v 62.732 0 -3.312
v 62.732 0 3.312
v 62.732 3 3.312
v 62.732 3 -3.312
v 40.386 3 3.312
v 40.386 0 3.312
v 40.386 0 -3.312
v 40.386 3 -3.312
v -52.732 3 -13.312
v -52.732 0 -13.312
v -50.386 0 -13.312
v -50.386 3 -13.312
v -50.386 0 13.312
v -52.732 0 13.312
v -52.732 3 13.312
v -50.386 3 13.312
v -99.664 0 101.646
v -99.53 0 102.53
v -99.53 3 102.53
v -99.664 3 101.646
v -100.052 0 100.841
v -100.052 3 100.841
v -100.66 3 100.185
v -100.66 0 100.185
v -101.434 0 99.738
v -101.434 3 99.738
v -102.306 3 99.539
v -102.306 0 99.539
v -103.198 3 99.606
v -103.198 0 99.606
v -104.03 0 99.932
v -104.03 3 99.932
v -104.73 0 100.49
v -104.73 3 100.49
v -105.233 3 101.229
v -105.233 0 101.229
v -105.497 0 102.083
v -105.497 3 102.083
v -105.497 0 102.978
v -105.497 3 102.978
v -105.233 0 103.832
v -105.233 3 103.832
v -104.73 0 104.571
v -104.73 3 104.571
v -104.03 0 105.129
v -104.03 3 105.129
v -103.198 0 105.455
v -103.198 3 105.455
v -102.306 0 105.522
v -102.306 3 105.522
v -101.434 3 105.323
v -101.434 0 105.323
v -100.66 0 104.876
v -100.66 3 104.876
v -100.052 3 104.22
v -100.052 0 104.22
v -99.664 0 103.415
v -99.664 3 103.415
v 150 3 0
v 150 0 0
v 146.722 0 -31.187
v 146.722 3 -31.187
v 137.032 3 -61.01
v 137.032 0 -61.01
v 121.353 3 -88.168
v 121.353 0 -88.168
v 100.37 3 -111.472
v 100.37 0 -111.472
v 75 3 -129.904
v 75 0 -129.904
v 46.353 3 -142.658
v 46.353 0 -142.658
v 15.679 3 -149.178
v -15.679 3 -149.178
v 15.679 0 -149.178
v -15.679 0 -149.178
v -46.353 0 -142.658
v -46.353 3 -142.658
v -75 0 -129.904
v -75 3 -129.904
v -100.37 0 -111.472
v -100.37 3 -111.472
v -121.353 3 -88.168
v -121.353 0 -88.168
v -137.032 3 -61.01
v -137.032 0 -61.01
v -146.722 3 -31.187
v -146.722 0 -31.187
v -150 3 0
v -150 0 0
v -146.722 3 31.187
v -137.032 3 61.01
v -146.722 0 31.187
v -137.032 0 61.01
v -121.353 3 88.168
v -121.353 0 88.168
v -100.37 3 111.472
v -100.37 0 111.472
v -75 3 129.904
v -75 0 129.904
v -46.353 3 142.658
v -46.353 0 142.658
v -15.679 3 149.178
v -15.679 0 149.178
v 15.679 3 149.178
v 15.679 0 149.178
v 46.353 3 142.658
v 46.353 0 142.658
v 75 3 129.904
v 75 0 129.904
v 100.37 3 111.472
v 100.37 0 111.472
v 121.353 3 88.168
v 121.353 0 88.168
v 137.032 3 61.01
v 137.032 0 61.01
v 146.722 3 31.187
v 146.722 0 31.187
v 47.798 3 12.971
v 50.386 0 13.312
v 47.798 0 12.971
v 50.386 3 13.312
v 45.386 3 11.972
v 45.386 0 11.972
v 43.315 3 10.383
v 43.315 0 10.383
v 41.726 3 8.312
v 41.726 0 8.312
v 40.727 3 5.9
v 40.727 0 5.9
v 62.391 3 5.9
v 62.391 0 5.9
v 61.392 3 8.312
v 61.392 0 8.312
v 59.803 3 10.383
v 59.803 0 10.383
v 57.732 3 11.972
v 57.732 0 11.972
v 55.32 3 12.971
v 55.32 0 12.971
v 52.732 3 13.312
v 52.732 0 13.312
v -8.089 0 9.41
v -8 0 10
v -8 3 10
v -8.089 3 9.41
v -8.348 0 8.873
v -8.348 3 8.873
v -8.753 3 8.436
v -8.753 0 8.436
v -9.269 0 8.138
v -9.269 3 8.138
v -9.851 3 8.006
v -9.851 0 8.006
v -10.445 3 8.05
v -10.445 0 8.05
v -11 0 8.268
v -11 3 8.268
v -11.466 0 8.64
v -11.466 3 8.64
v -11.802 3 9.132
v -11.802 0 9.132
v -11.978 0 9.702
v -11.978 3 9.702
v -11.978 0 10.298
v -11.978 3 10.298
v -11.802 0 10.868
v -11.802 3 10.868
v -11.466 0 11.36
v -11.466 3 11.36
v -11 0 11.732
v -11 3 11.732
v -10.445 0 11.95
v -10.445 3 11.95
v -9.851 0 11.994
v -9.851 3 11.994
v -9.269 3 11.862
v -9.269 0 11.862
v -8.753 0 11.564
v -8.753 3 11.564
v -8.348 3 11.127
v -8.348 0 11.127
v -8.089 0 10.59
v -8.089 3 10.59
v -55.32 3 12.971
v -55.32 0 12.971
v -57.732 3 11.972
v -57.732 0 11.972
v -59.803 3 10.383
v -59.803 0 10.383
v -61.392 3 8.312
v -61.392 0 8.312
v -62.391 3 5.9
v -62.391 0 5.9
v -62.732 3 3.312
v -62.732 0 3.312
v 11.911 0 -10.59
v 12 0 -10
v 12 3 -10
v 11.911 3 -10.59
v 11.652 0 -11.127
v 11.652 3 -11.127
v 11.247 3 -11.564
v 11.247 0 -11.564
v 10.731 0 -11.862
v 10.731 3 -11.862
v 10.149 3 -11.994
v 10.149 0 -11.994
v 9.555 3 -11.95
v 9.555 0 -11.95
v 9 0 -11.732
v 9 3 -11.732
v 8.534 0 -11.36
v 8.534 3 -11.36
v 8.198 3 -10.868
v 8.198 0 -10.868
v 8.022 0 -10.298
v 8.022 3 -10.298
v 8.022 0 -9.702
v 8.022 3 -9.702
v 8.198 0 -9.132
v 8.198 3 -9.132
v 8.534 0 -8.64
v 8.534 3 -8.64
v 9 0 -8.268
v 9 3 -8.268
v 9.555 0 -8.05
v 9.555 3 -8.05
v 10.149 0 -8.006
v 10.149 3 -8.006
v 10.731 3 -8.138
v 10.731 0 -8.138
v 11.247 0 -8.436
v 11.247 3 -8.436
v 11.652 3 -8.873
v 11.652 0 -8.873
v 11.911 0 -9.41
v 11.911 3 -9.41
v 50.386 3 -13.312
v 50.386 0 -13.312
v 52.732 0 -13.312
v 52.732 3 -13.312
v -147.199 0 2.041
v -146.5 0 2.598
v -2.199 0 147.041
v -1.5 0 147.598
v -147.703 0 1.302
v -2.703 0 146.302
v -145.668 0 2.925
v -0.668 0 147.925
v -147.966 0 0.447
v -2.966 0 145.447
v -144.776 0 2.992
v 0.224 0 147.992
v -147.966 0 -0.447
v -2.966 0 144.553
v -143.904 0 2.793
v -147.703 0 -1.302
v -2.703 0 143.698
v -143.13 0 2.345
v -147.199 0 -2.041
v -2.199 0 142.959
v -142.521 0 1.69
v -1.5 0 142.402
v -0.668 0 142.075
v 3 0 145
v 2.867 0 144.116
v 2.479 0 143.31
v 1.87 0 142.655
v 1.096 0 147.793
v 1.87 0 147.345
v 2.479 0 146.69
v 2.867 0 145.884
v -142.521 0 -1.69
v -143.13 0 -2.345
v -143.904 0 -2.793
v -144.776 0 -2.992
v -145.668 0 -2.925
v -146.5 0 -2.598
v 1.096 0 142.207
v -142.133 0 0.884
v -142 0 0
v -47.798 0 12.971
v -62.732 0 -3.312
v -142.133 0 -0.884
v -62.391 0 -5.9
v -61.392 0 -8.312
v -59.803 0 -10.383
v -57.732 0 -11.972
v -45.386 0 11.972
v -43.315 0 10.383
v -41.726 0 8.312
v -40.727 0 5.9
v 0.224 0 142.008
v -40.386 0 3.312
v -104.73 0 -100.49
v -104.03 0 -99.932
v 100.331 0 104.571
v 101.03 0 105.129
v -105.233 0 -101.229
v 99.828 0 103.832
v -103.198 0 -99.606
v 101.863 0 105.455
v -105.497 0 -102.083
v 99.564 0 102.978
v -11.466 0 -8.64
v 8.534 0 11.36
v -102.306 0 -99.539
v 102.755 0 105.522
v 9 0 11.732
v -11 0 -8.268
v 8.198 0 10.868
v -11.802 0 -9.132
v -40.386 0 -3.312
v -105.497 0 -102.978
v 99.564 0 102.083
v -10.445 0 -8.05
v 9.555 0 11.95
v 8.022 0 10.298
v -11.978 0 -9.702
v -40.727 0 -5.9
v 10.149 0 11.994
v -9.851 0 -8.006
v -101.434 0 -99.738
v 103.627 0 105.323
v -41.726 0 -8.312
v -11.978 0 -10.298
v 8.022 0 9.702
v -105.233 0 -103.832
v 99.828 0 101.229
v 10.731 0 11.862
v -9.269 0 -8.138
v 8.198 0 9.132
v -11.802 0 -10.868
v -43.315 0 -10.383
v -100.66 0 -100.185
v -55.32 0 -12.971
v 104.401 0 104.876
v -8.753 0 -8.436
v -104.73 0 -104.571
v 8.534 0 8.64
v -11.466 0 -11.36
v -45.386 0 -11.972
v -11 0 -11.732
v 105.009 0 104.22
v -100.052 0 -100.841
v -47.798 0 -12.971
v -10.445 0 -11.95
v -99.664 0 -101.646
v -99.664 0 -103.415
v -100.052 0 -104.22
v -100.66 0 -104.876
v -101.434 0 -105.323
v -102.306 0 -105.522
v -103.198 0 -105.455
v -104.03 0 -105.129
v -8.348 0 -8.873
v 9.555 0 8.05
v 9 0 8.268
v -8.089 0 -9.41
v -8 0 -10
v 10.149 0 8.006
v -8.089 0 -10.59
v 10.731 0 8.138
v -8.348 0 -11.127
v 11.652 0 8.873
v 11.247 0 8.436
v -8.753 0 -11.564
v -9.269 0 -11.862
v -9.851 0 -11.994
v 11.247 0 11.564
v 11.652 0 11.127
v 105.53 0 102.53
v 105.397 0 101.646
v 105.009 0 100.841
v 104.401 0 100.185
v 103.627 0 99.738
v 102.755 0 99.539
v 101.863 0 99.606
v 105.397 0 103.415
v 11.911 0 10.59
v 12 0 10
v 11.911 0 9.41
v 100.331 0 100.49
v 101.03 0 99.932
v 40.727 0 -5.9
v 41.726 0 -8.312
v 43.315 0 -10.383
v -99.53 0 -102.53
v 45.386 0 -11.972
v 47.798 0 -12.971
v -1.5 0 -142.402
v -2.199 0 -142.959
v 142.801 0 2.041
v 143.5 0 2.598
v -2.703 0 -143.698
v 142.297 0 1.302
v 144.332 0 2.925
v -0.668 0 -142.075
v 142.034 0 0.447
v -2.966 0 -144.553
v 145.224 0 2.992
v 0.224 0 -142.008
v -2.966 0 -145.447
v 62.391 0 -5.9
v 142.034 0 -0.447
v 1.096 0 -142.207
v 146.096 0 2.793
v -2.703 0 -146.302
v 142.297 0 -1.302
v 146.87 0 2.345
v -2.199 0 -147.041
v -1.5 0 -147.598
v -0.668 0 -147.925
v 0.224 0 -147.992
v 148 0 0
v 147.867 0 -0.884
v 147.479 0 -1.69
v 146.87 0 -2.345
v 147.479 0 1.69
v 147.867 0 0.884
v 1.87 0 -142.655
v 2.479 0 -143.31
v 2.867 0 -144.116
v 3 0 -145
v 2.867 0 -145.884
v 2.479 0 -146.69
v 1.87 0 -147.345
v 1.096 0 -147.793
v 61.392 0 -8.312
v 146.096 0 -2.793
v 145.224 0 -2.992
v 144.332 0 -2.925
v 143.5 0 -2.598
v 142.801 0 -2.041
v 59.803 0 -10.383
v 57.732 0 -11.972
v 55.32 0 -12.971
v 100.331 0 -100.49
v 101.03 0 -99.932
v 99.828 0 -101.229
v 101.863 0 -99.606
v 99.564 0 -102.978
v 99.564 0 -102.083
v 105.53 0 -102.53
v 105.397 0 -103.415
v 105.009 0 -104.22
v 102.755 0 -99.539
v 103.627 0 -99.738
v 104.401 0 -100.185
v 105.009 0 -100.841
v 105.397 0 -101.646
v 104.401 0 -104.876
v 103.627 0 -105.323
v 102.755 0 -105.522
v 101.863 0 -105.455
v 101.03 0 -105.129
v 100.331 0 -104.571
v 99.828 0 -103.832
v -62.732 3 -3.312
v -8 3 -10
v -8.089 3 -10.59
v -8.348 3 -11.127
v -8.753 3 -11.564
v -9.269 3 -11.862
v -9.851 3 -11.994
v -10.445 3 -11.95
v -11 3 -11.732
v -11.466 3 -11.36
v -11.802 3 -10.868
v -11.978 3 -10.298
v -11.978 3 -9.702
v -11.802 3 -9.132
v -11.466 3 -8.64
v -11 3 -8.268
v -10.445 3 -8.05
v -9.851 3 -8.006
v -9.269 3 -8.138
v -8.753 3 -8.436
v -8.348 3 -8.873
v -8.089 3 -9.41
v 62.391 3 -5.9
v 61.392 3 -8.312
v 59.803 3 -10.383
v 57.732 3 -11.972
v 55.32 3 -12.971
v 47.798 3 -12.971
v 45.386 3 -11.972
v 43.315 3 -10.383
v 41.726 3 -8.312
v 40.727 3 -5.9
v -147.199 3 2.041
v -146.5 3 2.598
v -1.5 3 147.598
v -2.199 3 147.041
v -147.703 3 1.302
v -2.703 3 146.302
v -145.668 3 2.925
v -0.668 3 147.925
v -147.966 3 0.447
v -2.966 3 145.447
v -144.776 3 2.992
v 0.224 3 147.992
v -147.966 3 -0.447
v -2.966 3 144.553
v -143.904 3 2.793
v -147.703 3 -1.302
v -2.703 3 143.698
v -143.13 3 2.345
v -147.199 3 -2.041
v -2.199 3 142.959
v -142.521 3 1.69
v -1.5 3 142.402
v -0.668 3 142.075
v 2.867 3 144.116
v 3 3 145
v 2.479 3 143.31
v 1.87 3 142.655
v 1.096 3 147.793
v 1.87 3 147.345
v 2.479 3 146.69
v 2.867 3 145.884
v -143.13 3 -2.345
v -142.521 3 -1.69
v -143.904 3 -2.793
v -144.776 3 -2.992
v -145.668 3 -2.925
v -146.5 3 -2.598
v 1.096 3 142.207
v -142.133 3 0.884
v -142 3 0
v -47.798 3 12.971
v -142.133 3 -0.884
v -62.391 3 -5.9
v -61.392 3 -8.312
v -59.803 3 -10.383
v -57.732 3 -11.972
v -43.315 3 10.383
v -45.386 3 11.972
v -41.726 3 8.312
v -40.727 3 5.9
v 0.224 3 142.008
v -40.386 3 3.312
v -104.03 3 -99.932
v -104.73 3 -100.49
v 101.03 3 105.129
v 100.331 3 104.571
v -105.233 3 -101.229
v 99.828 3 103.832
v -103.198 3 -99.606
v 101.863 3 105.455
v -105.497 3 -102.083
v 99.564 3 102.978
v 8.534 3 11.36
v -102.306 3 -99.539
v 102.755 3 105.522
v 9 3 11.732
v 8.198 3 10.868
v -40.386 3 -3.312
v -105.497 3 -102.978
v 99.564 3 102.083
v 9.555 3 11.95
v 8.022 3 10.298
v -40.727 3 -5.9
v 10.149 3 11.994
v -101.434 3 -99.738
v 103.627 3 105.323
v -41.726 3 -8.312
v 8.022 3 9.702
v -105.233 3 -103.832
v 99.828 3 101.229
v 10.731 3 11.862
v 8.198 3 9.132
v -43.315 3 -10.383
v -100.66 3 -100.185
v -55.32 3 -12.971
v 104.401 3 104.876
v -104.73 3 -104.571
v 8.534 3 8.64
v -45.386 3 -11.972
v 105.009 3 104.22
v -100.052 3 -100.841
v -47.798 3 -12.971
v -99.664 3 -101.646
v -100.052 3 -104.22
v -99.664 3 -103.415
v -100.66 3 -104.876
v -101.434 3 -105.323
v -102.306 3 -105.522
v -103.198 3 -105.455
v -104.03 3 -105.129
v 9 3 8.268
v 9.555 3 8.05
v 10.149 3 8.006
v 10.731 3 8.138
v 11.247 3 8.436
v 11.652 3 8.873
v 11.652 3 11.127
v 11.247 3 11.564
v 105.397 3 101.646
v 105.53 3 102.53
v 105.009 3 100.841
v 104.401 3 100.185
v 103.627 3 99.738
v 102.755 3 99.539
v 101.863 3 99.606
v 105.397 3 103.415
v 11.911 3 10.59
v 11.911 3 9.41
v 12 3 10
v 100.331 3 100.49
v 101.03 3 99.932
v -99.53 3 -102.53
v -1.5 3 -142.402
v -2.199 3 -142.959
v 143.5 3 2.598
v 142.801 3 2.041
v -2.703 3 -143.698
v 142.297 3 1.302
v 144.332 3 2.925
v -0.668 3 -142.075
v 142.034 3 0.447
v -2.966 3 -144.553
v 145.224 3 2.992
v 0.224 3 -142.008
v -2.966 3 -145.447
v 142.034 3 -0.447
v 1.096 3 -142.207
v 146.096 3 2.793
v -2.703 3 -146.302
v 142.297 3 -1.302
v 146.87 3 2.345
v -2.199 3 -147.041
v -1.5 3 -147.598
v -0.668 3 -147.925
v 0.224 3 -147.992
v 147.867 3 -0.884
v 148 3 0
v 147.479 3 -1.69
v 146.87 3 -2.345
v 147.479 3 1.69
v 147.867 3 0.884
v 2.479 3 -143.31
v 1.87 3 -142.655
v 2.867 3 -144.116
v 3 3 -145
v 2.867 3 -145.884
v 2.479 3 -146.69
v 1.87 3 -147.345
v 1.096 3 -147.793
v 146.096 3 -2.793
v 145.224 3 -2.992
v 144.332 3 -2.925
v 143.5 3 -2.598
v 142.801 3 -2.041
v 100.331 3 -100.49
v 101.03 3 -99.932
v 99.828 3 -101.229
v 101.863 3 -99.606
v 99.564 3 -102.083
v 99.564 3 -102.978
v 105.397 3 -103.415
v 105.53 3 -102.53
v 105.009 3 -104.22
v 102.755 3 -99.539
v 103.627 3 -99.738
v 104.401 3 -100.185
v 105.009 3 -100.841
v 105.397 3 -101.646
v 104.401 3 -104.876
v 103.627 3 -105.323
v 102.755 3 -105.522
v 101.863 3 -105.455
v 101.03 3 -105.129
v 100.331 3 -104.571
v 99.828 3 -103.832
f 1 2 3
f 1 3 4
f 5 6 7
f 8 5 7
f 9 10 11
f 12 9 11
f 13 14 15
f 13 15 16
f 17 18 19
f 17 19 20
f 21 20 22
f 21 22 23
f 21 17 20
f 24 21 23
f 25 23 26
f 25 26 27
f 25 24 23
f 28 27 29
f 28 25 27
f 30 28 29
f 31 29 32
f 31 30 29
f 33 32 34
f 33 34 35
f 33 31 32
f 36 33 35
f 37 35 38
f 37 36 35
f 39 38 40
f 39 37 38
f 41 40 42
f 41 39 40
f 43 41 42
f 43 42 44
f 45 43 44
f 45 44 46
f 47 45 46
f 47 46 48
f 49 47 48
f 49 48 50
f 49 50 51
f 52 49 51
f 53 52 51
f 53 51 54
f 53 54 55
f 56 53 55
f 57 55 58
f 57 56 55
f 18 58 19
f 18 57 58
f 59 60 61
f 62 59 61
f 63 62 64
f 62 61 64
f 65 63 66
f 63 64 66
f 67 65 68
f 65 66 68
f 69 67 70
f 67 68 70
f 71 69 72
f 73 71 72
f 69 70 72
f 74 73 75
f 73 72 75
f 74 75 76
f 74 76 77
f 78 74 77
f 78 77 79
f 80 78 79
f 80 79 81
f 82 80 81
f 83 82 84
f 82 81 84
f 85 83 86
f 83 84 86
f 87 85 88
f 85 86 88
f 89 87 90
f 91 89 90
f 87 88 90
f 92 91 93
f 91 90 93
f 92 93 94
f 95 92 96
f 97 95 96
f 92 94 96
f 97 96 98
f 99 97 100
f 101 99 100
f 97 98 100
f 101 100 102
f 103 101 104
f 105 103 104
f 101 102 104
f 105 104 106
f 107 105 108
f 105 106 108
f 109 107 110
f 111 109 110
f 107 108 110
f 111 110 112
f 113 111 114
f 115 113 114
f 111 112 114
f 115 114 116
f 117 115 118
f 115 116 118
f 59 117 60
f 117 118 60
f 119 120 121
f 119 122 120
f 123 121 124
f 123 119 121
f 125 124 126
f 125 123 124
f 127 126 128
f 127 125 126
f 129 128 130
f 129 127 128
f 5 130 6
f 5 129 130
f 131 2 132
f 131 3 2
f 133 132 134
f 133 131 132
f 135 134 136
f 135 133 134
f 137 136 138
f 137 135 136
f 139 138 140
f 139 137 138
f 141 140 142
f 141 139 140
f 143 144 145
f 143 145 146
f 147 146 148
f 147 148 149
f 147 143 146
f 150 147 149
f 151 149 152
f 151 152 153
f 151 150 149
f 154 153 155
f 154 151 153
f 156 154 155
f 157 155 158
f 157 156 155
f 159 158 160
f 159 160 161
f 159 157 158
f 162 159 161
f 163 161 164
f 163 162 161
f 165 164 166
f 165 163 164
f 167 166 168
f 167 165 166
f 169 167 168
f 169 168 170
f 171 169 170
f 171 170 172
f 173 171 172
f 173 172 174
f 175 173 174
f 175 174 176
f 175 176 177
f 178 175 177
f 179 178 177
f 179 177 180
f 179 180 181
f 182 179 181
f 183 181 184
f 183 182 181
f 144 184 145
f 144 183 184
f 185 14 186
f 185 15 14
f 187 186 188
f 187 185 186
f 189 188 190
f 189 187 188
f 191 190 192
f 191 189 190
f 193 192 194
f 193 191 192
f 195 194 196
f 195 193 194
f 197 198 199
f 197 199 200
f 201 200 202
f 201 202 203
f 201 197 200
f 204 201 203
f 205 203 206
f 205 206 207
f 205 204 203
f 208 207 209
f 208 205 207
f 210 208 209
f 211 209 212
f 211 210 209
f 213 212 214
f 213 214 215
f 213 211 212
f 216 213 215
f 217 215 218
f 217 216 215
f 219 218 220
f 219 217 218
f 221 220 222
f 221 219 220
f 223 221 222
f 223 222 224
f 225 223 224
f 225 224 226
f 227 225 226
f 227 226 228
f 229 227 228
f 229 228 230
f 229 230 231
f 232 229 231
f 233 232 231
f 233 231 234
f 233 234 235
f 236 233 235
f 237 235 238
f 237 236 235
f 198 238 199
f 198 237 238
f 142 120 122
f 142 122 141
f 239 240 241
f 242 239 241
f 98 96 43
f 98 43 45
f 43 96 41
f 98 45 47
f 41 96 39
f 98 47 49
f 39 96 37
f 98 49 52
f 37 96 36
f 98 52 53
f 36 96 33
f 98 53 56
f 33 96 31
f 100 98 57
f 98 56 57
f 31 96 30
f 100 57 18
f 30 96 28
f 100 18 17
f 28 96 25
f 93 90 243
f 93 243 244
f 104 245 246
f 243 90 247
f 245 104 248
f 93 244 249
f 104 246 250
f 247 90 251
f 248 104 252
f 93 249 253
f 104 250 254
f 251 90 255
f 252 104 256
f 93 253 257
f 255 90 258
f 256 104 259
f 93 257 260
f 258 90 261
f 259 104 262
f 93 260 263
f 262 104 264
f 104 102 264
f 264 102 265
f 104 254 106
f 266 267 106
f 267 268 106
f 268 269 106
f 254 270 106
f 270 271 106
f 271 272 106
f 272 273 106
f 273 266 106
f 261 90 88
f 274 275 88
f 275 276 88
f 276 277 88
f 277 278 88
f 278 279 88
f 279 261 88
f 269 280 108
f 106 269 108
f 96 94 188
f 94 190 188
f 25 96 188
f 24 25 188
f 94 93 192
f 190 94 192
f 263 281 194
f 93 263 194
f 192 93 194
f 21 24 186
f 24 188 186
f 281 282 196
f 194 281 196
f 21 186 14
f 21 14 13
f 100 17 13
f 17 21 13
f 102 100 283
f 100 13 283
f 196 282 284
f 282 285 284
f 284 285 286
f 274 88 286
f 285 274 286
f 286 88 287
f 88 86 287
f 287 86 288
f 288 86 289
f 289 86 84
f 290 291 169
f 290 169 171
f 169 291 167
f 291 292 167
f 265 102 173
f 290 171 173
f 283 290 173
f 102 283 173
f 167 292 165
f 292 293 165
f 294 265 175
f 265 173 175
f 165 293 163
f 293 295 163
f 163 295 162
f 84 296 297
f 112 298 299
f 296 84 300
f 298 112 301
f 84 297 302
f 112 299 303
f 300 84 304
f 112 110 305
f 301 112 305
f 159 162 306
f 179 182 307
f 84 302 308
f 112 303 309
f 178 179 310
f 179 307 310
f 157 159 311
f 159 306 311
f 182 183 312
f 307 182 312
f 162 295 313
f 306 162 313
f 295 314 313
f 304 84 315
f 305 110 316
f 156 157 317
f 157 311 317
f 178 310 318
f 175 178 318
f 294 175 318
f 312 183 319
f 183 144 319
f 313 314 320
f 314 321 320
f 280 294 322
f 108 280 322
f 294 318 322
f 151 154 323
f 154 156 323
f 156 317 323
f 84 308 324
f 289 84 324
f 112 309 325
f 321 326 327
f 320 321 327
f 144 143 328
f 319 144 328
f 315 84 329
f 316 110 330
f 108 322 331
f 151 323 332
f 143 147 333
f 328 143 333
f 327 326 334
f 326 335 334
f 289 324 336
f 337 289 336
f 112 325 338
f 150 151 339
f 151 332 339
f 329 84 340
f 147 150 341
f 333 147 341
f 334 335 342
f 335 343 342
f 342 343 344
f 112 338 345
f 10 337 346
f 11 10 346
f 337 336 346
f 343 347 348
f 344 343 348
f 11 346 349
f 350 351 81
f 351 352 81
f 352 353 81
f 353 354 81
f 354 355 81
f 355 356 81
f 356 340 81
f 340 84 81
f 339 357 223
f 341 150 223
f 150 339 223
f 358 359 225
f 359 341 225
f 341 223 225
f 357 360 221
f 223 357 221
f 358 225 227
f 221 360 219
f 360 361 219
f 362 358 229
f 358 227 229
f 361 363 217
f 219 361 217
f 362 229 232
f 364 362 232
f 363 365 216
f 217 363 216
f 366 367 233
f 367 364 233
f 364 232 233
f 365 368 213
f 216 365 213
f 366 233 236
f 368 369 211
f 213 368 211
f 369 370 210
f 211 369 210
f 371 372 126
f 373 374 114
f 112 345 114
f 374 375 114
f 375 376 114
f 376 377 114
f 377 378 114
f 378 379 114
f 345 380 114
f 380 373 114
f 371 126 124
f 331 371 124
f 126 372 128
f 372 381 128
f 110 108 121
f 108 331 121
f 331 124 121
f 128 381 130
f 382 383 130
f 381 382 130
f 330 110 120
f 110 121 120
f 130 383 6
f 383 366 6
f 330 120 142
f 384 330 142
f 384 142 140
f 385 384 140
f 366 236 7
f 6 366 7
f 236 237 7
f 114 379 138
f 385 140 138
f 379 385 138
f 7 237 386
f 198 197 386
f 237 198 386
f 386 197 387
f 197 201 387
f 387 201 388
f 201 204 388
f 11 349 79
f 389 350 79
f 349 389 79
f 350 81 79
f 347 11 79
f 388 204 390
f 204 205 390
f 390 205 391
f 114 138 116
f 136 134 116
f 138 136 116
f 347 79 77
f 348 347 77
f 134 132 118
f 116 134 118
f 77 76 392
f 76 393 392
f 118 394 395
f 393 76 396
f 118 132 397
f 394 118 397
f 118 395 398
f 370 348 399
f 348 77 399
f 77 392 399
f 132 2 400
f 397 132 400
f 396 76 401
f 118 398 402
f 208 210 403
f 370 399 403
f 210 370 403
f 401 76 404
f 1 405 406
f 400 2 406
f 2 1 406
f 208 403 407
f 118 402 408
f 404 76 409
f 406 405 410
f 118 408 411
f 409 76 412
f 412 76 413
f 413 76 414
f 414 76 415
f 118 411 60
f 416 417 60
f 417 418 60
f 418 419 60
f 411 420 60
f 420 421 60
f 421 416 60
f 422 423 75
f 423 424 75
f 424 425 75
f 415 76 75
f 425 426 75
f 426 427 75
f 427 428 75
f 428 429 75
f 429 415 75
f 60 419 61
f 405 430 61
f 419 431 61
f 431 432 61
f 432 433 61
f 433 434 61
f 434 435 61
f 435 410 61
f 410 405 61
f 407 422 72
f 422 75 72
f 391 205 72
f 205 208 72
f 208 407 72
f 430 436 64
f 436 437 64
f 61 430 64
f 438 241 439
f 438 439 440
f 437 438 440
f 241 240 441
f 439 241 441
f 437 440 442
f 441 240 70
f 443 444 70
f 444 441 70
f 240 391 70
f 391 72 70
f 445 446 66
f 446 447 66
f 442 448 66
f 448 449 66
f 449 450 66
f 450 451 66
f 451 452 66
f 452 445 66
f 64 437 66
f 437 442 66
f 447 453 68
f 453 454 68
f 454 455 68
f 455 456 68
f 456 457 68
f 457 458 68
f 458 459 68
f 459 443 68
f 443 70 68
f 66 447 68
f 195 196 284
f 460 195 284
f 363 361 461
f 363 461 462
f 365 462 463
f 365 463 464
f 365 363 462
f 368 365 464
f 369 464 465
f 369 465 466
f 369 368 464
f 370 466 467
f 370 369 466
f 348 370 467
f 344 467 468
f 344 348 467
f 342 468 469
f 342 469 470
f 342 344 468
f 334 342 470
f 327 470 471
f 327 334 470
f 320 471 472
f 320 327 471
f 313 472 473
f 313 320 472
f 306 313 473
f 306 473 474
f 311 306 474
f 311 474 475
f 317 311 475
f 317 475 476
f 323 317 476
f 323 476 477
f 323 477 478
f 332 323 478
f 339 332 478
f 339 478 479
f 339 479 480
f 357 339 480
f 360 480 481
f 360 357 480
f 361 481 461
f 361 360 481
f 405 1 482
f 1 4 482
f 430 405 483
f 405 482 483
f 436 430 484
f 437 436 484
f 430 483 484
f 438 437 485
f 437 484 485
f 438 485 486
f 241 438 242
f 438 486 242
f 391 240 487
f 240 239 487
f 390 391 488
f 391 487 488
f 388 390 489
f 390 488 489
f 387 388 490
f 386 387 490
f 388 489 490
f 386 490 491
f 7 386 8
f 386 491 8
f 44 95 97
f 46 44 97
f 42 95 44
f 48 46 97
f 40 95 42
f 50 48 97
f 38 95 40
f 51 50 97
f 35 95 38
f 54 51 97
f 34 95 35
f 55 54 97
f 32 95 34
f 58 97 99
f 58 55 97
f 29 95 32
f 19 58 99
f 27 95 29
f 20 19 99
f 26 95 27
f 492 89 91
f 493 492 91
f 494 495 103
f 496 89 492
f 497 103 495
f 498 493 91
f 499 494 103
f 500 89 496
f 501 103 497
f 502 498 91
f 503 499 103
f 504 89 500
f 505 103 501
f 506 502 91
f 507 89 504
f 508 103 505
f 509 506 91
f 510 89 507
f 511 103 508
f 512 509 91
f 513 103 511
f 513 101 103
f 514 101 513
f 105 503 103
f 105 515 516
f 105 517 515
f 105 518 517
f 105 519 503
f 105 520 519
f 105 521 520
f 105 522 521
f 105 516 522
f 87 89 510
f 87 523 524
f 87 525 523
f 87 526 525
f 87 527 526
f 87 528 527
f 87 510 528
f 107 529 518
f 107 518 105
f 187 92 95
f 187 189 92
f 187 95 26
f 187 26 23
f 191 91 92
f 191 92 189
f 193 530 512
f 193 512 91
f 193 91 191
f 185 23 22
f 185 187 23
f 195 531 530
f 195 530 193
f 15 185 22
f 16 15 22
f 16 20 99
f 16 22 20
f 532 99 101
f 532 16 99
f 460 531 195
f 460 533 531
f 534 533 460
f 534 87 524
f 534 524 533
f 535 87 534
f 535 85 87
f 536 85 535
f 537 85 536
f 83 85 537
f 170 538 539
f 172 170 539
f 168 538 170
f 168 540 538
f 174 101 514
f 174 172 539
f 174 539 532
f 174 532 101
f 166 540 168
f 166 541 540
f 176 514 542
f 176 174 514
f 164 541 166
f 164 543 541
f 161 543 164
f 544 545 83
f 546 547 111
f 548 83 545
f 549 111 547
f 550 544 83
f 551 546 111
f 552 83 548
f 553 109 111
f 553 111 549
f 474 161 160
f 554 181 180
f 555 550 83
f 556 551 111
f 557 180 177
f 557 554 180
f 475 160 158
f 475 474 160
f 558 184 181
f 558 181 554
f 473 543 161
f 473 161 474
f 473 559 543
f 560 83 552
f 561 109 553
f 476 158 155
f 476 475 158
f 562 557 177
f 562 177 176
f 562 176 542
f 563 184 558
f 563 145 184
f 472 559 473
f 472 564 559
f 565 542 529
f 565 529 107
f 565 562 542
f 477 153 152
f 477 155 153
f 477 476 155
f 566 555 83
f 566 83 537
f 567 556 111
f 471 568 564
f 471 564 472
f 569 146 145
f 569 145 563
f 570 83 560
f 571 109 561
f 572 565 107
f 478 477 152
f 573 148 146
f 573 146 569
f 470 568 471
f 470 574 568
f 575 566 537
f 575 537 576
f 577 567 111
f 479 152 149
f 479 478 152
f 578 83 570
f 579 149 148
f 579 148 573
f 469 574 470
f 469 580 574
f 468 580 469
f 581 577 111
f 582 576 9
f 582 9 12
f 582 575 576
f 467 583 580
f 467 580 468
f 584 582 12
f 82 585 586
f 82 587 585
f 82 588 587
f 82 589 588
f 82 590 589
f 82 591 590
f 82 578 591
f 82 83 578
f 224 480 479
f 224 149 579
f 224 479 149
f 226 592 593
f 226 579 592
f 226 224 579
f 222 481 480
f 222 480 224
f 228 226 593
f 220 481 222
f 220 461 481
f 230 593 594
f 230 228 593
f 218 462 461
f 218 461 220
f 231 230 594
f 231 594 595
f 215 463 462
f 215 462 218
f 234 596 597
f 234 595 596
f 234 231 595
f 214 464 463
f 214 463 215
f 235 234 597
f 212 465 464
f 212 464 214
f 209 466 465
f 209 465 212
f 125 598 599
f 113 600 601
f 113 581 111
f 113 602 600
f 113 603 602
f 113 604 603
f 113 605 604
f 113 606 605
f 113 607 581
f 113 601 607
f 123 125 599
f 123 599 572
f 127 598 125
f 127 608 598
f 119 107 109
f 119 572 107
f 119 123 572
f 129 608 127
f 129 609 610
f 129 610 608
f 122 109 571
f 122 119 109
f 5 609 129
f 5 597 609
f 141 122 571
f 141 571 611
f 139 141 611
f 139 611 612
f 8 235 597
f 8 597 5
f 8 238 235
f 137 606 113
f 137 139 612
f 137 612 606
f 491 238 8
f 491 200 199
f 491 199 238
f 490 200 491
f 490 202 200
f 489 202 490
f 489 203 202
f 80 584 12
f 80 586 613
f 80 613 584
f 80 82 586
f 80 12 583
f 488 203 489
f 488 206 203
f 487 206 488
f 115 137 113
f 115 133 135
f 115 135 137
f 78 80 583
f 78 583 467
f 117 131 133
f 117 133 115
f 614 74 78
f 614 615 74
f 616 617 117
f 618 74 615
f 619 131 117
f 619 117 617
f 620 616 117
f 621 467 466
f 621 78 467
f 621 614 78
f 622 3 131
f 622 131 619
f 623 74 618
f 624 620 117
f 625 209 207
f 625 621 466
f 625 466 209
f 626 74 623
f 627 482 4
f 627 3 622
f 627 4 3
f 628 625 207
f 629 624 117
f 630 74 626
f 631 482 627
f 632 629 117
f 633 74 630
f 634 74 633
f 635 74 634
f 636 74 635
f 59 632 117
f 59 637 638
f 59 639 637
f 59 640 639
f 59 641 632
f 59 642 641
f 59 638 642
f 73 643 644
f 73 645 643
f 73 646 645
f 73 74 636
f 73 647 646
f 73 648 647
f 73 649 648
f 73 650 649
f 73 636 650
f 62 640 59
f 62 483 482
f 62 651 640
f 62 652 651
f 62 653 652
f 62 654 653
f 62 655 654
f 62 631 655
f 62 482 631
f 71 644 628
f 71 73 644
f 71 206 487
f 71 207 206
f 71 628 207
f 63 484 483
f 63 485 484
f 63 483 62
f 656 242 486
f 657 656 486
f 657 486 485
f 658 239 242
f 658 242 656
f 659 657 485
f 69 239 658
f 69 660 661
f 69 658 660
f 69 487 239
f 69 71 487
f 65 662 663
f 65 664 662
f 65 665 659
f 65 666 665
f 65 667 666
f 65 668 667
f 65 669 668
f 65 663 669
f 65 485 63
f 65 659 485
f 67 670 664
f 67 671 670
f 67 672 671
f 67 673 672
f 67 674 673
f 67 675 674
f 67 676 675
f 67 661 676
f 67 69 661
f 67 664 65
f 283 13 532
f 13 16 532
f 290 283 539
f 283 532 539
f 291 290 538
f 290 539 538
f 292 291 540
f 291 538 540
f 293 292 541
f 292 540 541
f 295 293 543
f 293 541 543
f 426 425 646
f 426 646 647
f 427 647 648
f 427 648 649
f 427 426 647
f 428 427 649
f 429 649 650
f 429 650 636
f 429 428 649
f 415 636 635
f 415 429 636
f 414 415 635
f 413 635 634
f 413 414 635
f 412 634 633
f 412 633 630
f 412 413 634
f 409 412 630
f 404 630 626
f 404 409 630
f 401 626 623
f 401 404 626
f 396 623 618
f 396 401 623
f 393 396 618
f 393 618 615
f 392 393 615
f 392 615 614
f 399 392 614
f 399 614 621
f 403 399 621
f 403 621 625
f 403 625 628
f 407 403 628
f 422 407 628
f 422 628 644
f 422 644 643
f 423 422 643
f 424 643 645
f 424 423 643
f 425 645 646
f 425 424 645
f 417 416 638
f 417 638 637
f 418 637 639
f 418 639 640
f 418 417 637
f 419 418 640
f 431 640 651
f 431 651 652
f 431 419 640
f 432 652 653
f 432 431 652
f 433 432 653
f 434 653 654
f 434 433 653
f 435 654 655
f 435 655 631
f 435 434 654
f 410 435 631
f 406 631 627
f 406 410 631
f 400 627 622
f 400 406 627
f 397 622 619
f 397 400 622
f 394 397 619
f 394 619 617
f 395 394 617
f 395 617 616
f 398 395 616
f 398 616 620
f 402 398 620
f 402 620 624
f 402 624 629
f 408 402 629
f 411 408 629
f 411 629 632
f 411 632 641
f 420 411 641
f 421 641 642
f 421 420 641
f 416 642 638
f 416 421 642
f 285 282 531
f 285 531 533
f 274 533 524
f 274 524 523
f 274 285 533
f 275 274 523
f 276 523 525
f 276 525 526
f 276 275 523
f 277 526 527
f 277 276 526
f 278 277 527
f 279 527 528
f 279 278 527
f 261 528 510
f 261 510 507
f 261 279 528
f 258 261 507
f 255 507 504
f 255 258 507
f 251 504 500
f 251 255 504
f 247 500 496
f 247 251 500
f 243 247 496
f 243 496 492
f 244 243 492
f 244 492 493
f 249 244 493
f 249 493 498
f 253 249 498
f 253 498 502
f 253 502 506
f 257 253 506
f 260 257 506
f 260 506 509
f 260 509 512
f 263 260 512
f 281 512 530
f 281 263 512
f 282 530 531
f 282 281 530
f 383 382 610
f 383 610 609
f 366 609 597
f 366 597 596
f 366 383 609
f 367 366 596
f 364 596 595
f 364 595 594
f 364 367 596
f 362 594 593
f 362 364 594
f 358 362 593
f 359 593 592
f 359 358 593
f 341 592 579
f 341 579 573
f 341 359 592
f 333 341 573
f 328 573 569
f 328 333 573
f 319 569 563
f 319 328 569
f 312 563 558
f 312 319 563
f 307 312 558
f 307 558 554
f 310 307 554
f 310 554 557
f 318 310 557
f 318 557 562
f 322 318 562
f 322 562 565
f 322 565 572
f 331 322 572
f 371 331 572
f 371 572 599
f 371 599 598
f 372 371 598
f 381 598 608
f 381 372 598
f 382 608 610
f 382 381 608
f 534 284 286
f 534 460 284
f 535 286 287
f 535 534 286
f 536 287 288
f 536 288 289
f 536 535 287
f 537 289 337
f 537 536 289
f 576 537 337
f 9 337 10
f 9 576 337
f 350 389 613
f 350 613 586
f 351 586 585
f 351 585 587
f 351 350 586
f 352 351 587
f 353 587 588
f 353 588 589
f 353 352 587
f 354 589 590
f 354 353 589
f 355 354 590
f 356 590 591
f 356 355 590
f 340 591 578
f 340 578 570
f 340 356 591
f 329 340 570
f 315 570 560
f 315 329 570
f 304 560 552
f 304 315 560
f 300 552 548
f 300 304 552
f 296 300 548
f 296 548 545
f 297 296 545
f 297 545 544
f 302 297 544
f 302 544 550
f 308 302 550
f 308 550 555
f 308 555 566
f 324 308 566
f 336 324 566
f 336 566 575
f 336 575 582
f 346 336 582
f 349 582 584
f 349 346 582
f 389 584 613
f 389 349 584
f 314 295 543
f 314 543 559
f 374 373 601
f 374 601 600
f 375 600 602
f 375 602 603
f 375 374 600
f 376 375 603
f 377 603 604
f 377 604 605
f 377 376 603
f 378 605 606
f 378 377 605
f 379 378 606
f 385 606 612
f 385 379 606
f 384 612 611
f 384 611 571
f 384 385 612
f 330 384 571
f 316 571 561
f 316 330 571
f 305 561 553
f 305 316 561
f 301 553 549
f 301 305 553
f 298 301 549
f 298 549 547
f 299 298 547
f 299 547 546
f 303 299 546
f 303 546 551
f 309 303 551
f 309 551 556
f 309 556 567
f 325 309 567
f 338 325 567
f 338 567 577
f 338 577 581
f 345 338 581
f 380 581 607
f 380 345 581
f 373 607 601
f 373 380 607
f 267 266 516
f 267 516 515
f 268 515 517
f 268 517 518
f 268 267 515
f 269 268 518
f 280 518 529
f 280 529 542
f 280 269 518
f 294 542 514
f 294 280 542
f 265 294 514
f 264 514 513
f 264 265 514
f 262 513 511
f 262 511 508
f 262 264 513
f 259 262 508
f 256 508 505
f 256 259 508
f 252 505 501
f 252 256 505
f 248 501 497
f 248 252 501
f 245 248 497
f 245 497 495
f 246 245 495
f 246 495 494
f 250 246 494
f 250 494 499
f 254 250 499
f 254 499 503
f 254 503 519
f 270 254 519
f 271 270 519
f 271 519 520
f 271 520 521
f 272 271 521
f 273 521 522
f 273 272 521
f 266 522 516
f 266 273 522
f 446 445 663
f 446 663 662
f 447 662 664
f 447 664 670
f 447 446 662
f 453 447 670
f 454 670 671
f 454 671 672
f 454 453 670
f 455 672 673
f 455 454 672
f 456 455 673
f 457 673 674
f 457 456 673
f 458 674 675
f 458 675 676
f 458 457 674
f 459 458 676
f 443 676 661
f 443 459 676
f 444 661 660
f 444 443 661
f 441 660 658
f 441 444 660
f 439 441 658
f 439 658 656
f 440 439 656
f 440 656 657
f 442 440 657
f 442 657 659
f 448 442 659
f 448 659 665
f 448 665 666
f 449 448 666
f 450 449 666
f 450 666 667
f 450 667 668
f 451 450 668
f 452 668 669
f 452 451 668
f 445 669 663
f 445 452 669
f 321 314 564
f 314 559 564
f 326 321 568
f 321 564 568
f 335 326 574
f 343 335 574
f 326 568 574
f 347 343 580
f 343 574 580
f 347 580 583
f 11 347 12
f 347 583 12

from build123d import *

# Parameters (mm, degrees)
EXTRUDE_1_OUTLINE_R   = 150
EXTRUDE_1_OUTLINE_R_2 = 3
EXTRUDE_1_OUTLINE_R_3 = 2
EXTRUDE_1_OUTLINE_W   = 22.346122356
EXTRUDE_1_OUTLINE_H   = 26.623931282
EXTRUDE_1_DEPTH       = 3
FILLET_1_R            = 10
FILLET_2_R            = 10
FILLET_3_R            = 10
FILLET_4_R            = 10
FILLET_5_R            = 10
FILLET_6_R            = 10
FILLET_7_R            = 10
FILLET_8_R            = 10


# Read off the part's stored shape, not the designer's step: Бобышка-Вытянуть1
with BuildPart() as part:
    # Бобышка-Вытянуть1 outline → Бобышка-Вытянуть1 (new body)
    with BuildSketch(Plane(origin=(0, 0, 0), x_dir=(1, 0, 0), z_dir=(0, 1, 0))):
        Circle(EXTRUDE_1_OUTLINE_R)
        with Locations((-102.530483272, -102.530483272)):
            Circle(EXTRUDE_1_OUTLINE_R_2, mode=Mode.SUBTRACT)
        with Locations((-10, -10)):
            Circle(EXTRUDE_1_OUTLINE_R_3, mode=Mode.SUBTRACT)
        with Locations((0, -145)):
            Circle(EXTRUDE_1_OUTLINE_R_2, mode=Mode.SUBTRACT)
        with Locations((102.530483272, -102.530483272)):
            Circle(EXTRUDE_1_OUTLINE_R_2, mode=Mode.SUBTRACT)
        with Locations((10, -10)):
            Circle(EXTRUDE_1_OUTLINE_R_3, mode=Mode.SUBTRACT)
        with Locations((-145, 0)):
            Circle(EXTRUDE_1_OUTLINE_R_2, mode=Mode.SUBTRACT)
        with Locations((-51.559180368, 0)):
            Rectangle(EXTRUDE_1_OUTLINE_W, EXTRUDE_1_OUTLINE_H, mode=Mode.SUBTRACT)
        with Locations((-10, 10)):
            Circle(EXTRUDE_1_OUTLINE_R_3, mode=Mode.SUBTRACT)
        with Locations((-102.530483272, 102.530483272)):
            Circle(EXTRUDE_1_OUTLINE_R_2, mode=Mode.SUBTRACT)
        with Locations((10, 10)):
            Circle(EXTRUDE_1_OUTLINE_R_3, mode=Mode.SUBTRACT)
        with Locations((51.559180368, 0)):
            Rectangle(EXTRUDE_1_OUTLINE_W, EXTRUDE_1_OUTLINE_H, mode=Mode.SUBTRACT)
        with Locations((145, 0)):
            Circle(EXTRUDE_1_OUTLINE_R_2, mode=Mode.SUBTRACT)
        with Locations((0, 145)):
            Circle(EXTRUDE_1_OUTLINE_R_2, mode=Mode.SUBTRACT)
        with Locations((102.530483272, 102.530483272)):
            Circle(EXTRUDE_1_OUTLINE_R_2, mode=Mode.SUBTRACT)
    extrude(amount=EXTRUDE_1_DEPTH)

    # Скругление1
    fillet_1_edges = [part.edges().sort_by_distance(p)[0] for p in [
        (-62.732241546, 1.5, -13.311965641),
    ]]
    fillet(fillet_1_edges, radius=FILLET_1_R)

    # Скругление2
    fillet_2_edges = [part.edges().sort_by_distance(p)[0] for p in [
        (-40.38611919, 1.5, 13.311965641),
    ]]
    fillet(fillet_2_edges, radius=FILLET_2_R)

    # Скругление3
    fillet_3_edges = [part.edges().sort_by_distance(p)[0] for p in [
        (40.38611919, 1.5, 13.311965641),
    ]]
    fillet(fillet_3_edges, radius=FILLET_3_R)

    # Скругление4
    fillet_4_edges = [part.edges().sort_by_distance(p)[0] for p in [
        (62.732241546, 1.5, -13.311965641),
    ]]
    fillet(fillet_4_edges, radius=FILLET_4_R)

    # Скругление5
    fillet_5_edges = [part.edges().sort_by_distance(p)[0] for p in [
        (-40.38611919, 1.5, -13.311965641),
    ]]
    fillet(fillet_5_edges, radius=FILLET_5_R)

    # Скругление6
    fillet_6_edges = [part.edges().sort_by_distance(p)[0] for p in [
        (-62.732241546, 1.5, 13.311965641),
    ]]
    fillet(fillet_6_edges, radius=FILLET_6_R)

    # Скругление7
    fillet_7_edges = [part.edges().sort_by_distance(p)[0] for p in [
        (62.732241546, 1.5, 13.311965641),
    ]]
    fillet(fillet_7_edges, radius=FILLET_7_R)

    # Скругление8
    fillet_8_edges = [part.edges().sort_by_distance(p)[0] for p in [
        (40.38611919, 1.5, -13.311965641),
    ]]
    fillet(fillet_8_edges, radius=FILLET_8_R)


solid = part.part
